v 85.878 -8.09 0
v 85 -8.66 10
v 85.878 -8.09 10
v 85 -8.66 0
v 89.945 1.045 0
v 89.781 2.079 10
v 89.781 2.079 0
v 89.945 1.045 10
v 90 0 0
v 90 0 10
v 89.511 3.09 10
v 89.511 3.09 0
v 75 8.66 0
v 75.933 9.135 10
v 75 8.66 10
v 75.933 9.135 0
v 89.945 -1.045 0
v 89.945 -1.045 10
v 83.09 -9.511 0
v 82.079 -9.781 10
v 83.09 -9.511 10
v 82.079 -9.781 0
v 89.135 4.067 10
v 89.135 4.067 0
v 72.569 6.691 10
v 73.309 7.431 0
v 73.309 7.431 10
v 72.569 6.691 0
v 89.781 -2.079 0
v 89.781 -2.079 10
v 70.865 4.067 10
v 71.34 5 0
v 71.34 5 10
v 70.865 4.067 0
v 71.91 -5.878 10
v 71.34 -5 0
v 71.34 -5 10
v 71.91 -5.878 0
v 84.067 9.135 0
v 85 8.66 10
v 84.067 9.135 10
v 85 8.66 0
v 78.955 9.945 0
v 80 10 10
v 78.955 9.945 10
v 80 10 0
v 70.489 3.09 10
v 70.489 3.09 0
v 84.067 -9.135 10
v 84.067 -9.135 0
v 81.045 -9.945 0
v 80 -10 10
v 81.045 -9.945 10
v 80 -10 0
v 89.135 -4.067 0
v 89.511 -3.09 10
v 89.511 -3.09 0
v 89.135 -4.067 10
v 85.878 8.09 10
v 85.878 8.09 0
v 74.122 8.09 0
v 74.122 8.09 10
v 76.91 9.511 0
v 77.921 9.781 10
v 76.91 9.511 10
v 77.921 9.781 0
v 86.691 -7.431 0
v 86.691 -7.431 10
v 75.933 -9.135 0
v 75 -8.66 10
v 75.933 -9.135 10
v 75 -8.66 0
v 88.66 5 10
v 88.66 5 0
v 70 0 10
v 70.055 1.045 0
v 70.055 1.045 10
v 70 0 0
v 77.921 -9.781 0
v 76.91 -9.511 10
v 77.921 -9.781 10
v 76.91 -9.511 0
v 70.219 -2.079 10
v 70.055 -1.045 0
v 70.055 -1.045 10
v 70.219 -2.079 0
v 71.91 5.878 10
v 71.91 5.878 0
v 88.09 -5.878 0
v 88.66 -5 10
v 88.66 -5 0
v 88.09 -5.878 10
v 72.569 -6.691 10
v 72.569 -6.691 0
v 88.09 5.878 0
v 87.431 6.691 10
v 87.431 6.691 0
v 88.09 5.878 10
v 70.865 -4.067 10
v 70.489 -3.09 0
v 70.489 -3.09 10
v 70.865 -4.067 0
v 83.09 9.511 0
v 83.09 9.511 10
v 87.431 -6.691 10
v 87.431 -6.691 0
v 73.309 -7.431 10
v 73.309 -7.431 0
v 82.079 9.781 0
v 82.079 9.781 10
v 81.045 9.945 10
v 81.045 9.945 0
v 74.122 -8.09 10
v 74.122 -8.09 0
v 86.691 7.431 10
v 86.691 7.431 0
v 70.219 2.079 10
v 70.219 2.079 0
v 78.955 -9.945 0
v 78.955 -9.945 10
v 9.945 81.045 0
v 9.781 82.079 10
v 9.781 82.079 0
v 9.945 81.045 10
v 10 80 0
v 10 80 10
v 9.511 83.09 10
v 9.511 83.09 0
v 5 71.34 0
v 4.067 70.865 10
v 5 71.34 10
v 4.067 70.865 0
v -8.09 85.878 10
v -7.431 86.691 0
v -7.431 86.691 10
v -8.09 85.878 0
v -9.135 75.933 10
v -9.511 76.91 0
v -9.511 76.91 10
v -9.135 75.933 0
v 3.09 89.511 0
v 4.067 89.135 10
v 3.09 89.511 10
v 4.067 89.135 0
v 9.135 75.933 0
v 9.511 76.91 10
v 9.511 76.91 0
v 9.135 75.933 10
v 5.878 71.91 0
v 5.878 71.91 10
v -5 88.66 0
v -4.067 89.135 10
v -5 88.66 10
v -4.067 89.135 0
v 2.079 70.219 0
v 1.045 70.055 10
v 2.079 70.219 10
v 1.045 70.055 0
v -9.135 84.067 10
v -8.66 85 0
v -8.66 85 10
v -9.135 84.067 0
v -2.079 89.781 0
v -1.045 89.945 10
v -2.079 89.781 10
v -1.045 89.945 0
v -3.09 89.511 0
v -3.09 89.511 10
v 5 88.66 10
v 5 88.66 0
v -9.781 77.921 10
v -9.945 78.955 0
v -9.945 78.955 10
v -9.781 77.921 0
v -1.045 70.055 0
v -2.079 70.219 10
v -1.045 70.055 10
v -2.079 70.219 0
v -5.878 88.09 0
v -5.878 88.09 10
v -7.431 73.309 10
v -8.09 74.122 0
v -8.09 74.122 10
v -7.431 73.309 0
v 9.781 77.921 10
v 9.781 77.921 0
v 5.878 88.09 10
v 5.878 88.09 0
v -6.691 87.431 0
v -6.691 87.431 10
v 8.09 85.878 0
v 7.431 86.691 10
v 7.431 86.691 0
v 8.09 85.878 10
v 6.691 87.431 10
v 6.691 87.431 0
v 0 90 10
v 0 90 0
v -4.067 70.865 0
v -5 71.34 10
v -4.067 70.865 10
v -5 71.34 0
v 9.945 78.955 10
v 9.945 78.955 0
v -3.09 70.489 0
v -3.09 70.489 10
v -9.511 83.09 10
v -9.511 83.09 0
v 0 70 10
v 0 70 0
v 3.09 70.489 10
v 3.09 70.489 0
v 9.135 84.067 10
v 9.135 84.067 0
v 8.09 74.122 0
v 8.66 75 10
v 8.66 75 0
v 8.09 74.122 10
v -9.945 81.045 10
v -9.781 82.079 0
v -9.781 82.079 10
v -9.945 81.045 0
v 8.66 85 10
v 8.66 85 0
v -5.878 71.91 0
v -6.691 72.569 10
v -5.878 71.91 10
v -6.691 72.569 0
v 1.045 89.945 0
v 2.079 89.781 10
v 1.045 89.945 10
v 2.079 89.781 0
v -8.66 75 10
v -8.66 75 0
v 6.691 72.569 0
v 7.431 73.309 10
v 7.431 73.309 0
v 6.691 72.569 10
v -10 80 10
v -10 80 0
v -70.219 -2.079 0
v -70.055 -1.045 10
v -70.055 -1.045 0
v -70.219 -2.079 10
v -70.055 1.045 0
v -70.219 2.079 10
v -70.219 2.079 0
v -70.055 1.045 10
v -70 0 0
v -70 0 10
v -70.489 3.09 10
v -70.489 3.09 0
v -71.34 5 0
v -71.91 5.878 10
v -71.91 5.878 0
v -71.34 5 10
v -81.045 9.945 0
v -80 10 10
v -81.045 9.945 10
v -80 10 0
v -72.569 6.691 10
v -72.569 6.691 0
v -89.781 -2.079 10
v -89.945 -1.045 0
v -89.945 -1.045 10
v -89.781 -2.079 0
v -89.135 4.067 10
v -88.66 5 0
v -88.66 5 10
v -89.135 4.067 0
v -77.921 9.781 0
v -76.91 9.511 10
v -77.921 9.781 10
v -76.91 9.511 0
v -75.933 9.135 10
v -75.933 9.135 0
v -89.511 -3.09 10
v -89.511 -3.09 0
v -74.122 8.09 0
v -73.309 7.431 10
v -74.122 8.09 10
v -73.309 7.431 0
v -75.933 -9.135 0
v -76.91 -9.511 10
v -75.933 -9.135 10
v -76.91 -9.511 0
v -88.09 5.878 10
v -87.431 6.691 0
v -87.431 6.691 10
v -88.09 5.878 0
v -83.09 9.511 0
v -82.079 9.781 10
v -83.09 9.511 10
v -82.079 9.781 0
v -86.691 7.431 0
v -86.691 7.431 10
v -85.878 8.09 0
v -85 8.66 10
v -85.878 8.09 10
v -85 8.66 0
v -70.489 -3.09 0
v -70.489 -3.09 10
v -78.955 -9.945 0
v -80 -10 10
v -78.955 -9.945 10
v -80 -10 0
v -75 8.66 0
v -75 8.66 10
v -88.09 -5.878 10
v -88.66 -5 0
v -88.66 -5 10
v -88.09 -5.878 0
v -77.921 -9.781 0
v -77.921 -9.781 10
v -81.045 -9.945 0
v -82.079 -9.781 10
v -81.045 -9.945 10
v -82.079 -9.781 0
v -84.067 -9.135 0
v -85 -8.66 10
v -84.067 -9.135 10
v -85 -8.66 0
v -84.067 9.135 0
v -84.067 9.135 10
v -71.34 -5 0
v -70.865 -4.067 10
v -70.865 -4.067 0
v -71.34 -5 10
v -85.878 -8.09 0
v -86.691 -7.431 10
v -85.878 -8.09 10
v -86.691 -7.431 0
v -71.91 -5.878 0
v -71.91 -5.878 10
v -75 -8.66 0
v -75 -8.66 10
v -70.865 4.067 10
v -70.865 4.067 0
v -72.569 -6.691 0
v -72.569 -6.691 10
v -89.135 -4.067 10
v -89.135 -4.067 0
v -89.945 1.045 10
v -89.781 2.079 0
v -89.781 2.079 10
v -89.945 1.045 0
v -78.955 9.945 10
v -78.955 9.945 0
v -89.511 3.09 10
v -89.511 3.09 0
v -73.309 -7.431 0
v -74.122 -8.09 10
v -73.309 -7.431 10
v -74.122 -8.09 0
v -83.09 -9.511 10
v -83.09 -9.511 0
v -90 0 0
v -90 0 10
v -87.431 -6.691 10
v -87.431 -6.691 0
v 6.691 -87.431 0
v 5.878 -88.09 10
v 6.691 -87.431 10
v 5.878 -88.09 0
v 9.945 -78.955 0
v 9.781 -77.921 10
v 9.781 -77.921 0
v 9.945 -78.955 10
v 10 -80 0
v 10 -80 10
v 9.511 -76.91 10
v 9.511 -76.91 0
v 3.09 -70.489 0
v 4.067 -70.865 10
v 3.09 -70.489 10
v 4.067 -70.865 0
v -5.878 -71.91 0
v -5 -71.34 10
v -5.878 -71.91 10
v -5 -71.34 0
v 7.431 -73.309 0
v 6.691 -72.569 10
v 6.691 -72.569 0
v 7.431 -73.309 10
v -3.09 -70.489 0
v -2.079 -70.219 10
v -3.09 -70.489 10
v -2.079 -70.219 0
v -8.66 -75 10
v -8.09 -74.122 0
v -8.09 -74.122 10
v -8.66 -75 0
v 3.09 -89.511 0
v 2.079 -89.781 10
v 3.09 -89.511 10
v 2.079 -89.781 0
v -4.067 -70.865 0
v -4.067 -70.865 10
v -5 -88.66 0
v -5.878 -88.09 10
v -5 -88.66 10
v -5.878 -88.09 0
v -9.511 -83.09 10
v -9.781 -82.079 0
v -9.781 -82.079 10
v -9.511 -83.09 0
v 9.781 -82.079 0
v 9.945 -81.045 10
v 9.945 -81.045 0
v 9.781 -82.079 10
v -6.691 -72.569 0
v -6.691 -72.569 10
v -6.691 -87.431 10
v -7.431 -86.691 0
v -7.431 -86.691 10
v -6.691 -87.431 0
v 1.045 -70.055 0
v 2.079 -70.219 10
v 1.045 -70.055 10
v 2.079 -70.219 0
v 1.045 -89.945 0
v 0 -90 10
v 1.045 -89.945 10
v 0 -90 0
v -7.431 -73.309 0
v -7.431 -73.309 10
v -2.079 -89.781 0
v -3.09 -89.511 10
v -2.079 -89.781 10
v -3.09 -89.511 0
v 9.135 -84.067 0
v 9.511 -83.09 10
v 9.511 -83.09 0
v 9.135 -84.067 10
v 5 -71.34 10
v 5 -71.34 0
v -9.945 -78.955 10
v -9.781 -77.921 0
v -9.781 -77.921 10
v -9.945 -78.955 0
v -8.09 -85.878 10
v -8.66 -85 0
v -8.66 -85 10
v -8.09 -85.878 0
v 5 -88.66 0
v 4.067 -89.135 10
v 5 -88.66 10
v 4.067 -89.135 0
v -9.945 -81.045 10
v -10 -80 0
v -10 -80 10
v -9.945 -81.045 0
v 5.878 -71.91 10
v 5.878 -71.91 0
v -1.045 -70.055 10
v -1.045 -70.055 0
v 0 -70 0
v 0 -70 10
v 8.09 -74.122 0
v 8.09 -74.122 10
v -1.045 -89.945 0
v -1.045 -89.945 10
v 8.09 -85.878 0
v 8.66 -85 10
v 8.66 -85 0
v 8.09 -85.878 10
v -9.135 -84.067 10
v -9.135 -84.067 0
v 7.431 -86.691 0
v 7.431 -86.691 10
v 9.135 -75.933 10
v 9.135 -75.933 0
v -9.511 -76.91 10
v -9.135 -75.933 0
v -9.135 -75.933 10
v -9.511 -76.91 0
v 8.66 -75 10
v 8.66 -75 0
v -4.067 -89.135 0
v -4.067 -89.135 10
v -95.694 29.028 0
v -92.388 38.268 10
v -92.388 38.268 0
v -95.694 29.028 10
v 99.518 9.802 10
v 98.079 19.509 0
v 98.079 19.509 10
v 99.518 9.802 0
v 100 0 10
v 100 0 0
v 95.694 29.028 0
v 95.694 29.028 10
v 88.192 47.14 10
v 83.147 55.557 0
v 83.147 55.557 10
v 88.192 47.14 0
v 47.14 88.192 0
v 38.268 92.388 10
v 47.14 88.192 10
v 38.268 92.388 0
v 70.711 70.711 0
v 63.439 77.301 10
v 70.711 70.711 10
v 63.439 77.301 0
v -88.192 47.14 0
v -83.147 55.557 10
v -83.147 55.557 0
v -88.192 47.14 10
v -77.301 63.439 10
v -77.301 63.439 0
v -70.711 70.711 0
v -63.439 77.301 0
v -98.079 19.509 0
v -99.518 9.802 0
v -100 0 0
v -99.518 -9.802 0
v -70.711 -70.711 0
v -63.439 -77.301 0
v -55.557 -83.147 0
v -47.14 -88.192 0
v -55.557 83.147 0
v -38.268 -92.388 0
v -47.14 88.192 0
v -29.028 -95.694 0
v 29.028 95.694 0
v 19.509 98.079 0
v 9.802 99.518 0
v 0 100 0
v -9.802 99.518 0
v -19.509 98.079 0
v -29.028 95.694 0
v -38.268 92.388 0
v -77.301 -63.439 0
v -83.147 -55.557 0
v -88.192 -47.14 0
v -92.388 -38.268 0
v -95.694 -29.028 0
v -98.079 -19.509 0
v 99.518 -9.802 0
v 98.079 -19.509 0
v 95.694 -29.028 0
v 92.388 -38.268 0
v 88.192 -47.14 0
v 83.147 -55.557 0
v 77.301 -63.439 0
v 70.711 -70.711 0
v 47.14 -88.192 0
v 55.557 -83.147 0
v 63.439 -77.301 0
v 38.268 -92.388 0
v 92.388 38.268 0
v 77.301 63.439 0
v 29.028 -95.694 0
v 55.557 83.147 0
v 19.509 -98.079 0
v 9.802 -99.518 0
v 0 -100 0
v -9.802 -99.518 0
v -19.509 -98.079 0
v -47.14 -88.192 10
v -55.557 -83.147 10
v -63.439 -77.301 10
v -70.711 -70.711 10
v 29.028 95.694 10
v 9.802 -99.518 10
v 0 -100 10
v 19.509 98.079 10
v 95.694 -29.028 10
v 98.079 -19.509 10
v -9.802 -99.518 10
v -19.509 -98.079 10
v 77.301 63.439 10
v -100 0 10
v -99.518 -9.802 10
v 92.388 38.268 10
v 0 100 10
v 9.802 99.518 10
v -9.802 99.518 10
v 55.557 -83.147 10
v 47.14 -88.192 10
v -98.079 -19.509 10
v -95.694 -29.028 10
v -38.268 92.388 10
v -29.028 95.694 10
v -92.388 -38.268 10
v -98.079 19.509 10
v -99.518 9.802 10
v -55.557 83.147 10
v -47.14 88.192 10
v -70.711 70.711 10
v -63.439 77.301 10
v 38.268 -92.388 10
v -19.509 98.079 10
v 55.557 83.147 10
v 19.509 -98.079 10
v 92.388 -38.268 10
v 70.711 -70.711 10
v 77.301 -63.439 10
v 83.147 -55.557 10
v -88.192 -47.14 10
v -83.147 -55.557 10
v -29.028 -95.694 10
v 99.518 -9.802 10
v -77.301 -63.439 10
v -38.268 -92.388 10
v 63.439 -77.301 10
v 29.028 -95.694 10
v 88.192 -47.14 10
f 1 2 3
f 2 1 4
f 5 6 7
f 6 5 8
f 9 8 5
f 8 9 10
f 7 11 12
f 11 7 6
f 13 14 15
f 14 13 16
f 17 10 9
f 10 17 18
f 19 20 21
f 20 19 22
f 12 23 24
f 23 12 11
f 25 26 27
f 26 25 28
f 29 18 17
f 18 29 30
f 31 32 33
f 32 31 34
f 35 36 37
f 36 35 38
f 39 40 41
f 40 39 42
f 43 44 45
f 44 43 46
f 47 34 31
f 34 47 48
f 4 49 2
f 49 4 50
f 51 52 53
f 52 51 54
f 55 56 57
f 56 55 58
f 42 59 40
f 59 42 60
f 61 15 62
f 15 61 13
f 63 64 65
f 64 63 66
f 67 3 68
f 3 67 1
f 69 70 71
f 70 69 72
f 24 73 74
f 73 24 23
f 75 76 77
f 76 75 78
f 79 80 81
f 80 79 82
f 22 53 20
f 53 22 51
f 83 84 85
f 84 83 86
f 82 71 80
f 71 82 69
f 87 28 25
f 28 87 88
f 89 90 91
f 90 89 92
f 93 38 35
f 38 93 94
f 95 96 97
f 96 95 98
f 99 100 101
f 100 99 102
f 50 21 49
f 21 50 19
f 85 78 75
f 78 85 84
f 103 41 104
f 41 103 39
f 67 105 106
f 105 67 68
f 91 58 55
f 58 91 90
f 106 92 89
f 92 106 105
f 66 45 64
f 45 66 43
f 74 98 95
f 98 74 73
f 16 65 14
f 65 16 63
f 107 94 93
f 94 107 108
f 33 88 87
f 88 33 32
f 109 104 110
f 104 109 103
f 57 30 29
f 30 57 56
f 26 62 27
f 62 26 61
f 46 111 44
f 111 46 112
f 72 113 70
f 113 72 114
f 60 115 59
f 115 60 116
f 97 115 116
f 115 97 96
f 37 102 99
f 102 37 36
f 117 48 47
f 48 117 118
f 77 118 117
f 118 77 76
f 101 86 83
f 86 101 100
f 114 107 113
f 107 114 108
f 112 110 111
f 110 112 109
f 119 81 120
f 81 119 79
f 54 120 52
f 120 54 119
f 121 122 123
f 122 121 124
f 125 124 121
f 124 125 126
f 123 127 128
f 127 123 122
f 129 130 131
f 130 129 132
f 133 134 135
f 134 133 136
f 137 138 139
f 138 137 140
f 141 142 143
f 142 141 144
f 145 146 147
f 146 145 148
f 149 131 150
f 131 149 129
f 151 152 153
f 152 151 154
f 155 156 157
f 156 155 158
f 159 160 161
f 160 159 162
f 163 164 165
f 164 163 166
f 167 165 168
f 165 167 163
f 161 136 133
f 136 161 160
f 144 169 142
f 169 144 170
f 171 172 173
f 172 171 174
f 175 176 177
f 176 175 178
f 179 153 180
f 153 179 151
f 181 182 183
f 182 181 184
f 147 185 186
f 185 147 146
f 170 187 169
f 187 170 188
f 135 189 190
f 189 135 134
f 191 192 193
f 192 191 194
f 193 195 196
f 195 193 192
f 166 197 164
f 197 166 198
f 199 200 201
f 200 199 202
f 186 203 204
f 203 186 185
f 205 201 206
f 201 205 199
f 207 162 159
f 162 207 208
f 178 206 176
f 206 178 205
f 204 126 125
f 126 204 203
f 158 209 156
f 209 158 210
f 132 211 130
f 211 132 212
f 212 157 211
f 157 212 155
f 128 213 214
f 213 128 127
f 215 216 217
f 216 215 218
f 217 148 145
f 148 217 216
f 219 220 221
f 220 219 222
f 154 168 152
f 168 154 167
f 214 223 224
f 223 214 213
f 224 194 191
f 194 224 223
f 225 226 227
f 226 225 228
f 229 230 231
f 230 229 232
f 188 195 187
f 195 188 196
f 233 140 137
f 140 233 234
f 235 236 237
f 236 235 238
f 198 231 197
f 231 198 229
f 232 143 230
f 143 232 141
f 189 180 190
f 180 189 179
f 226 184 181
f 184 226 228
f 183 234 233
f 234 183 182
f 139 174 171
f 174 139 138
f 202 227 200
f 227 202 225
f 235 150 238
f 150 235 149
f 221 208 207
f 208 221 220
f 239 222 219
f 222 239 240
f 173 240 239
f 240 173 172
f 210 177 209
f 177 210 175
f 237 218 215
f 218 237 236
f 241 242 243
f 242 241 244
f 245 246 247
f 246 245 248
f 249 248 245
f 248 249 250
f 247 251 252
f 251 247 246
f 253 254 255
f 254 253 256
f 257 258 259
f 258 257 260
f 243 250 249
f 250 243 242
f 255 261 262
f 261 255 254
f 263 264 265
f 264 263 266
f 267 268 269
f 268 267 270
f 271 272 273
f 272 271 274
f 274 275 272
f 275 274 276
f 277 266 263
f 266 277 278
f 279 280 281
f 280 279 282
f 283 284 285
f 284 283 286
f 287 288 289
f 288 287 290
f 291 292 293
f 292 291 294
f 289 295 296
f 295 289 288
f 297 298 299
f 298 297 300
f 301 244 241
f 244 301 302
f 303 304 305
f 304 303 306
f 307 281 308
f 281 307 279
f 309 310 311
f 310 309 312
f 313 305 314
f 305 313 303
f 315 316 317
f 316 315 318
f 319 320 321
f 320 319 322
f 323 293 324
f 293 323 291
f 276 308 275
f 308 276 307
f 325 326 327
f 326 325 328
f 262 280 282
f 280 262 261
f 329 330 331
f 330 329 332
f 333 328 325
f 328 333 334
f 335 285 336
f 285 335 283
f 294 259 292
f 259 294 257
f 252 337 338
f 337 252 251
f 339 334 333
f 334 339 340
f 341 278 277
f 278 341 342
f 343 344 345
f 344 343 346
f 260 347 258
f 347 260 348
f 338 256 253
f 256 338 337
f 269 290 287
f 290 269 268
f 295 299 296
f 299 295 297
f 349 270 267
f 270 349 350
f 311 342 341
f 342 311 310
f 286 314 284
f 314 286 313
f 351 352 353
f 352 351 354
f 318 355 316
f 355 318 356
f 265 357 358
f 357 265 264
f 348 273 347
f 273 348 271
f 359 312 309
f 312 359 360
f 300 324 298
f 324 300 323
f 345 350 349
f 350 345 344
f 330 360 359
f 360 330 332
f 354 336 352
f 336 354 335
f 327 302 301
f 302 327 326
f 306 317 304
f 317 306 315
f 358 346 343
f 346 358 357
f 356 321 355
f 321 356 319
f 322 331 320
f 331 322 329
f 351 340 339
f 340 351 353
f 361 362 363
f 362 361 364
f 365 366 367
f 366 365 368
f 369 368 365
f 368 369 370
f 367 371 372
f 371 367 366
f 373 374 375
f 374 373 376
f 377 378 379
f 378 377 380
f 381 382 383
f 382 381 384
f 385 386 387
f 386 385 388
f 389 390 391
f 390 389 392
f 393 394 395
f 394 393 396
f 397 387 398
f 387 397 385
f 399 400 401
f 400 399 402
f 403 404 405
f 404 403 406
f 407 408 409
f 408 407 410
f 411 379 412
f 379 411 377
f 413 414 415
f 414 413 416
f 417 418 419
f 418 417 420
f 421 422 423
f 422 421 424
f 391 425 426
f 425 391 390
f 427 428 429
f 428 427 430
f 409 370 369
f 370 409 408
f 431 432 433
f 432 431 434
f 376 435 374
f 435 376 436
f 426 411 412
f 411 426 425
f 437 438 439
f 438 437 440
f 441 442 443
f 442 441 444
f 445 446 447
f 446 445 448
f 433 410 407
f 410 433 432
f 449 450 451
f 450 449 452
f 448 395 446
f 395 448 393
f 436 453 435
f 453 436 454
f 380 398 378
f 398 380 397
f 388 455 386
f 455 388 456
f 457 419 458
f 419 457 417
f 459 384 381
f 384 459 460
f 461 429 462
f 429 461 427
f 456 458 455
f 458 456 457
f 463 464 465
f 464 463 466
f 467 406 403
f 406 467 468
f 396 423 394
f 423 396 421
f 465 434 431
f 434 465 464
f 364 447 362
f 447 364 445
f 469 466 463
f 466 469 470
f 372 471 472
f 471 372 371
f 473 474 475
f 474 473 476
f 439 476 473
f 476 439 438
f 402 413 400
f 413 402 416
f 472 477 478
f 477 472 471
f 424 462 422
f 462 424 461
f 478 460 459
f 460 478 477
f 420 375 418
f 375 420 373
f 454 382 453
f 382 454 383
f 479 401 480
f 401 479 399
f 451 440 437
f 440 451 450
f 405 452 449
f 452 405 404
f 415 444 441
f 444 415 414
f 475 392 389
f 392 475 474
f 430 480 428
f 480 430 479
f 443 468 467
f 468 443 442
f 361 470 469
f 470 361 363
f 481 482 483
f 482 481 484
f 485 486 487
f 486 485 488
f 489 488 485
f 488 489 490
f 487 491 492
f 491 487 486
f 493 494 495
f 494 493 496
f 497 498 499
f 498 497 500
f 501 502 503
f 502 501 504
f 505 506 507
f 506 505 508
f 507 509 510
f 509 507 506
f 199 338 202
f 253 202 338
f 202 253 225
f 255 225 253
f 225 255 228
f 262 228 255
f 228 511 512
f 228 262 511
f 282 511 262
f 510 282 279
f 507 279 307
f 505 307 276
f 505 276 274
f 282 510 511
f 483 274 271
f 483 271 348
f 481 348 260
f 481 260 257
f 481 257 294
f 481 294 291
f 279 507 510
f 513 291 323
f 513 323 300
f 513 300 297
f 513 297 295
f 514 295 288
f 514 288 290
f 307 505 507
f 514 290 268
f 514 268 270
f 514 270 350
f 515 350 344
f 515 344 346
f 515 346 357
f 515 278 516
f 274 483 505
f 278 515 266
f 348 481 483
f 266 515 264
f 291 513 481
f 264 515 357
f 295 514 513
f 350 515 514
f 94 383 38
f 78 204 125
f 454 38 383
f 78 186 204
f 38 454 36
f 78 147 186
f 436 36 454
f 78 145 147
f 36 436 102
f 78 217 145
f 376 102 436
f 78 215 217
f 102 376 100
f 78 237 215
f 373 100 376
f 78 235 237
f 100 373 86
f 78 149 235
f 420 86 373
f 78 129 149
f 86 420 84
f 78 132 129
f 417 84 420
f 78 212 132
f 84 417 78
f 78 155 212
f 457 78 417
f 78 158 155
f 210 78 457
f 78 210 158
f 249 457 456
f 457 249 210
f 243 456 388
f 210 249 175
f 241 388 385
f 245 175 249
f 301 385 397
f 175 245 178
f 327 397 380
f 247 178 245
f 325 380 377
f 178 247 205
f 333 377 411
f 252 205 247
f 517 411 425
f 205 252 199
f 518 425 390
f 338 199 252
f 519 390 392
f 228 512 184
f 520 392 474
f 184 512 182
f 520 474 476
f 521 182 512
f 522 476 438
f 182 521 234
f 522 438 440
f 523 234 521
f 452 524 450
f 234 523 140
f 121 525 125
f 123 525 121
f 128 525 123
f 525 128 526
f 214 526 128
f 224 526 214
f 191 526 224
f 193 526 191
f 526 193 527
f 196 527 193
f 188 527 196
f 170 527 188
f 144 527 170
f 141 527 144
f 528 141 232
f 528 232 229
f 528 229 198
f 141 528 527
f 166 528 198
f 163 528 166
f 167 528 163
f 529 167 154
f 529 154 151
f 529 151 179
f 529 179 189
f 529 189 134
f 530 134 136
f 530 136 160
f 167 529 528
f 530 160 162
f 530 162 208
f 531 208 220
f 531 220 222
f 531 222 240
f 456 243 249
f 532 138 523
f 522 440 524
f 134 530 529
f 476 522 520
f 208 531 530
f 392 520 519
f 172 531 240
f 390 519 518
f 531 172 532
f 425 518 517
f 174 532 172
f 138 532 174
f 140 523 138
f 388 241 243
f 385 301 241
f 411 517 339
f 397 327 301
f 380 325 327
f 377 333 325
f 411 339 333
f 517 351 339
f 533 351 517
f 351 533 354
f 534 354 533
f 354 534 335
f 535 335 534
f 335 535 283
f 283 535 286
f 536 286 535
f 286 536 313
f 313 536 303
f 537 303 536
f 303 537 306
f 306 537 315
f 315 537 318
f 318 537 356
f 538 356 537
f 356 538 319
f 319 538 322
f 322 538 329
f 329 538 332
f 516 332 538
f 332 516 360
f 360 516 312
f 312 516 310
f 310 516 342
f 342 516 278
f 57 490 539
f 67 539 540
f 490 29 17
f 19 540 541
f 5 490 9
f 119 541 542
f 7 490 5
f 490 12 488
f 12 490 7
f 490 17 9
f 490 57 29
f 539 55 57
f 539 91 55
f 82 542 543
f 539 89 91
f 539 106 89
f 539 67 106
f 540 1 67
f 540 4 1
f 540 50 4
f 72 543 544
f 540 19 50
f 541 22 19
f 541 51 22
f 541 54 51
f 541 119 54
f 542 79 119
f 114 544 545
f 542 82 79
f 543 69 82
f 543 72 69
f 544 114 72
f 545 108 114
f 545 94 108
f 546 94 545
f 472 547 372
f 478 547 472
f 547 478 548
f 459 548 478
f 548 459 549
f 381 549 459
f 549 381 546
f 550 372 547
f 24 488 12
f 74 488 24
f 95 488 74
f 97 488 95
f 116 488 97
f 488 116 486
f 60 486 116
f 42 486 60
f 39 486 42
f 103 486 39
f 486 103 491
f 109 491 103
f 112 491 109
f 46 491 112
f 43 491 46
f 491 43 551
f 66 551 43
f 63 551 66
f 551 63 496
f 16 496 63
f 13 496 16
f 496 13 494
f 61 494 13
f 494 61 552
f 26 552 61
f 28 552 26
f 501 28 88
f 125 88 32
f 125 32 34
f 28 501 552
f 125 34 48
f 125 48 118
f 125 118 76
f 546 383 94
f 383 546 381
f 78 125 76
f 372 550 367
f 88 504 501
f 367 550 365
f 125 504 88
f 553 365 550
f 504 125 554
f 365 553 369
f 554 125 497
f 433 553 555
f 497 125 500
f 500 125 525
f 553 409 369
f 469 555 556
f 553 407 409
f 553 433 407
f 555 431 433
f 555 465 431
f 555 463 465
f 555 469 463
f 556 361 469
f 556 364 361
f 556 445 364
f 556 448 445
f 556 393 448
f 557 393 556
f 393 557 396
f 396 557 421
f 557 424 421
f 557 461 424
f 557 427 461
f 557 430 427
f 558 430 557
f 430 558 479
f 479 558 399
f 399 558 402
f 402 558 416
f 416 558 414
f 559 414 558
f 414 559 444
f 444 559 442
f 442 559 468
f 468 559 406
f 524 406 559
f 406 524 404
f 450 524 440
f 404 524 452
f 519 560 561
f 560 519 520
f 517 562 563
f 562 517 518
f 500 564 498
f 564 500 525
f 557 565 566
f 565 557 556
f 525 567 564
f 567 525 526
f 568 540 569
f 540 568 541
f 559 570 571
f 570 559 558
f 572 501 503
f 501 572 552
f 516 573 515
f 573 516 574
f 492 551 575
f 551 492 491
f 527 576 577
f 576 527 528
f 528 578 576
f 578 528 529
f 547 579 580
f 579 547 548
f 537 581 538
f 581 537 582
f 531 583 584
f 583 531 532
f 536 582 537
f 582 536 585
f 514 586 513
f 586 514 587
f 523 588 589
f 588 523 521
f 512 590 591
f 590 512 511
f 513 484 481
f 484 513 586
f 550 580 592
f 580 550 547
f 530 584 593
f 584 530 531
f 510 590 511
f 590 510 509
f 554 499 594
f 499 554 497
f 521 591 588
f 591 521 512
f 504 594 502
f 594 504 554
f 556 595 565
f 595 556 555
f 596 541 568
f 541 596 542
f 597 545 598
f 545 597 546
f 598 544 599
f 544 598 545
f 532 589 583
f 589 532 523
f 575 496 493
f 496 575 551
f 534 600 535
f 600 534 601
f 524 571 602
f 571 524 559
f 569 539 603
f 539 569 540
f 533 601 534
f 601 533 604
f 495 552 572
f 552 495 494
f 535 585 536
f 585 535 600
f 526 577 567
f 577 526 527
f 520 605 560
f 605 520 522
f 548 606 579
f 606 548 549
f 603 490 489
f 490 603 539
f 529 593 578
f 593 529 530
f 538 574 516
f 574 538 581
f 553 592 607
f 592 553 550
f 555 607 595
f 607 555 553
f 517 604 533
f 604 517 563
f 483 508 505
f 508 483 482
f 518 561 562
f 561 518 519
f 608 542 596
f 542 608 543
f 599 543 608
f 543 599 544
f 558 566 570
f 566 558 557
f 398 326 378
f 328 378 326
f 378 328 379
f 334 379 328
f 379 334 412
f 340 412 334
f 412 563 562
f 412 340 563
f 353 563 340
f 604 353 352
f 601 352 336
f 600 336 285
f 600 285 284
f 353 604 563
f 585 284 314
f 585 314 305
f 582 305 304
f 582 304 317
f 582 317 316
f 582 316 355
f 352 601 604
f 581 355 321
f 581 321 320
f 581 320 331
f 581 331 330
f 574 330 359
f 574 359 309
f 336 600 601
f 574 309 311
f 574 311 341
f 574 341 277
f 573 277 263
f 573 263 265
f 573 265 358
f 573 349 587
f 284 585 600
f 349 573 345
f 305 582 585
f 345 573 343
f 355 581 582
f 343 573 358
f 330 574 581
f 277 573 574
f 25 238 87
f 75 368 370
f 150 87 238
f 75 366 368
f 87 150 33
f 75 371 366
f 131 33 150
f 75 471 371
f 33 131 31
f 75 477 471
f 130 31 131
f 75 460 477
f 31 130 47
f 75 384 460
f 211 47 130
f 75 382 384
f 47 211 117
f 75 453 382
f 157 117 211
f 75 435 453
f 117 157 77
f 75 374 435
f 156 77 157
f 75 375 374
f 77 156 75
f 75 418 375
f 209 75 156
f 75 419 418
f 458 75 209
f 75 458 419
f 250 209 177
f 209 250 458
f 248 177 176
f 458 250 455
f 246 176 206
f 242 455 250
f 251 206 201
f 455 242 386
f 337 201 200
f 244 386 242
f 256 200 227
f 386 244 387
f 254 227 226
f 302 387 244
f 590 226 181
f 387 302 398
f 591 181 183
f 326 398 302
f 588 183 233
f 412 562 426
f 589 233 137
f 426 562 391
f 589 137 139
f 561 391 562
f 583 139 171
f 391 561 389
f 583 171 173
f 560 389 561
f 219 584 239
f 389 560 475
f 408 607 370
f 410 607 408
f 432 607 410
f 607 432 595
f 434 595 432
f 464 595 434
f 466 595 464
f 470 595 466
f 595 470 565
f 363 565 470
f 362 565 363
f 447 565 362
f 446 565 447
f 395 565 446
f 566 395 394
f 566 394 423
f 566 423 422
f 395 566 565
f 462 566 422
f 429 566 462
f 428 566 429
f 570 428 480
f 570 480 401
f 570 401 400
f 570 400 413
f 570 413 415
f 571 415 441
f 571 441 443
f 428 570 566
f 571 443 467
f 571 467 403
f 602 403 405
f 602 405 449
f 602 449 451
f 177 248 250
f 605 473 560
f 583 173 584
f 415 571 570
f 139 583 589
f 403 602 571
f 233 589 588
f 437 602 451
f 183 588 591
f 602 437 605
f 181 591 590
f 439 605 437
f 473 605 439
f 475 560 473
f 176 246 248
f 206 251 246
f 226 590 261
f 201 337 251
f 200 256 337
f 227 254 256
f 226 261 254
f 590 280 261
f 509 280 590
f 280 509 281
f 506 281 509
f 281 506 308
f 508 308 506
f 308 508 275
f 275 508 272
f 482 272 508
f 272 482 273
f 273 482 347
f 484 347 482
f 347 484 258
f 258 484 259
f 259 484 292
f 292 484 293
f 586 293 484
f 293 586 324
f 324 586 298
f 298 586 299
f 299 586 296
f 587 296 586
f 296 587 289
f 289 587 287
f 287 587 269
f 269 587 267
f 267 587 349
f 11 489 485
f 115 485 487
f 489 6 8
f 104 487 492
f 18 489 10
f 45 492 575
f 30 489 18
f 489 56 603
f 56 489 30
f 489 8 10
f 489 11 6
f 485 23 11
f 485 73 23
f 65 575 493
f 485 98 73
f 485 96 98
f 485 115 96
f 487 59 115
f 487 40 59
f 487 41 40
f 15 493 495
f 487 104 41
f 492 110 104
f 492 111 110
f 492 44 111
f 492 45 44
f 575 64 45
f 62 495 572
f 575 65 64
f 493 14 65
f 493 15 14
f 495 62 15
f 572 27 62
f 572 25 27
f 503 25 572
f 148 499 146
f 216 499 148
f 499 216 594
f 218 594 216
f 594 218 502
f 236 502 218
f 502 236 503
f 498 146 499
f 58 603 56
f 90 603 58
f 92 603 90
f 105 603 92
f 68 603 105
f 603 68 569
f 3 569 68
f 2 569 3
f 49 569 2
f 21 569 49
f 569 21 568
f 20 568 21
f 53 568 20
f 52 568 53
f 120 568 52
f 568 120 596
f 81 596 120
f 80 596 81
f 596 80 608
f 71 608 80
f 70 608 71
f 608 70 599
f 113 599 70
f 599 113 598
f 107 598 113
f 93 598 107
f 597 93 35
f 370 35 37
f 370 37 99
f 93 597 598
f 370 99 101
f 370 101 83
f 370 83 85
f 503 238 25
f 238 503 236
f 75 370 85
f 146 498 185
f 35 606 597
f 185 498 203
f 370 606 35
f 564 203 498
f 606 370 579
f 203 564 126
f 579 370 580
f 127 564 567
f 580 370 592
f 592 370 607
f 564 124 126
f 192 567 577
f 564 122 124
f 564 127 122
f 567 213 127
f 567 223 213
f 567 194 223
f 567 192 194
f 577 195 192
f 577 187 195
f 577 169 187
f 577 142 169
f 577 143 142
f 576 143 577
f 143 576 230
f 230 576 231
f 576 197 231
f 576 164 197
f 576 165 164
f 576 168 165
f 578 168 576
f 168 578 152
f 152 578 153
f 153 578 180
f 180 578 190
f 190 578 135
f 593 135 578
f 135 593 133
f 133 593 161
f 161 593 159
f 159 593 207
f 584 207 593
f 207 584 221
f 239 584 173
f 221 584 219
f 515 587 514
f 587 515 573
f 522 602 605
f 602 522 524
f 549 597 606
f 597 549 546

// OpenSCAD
module Flange_02(){
    color("#c0c6c7")
    
    difference(){
        cylinder(10,100,100, $fn = $preview ? 32 : 64);
        r = 80;
        for (i=[0:90:359]) {
            translate([r*cos(i),r*sin(i),-1])
            cylinder(12,10,10,$fn=60);
            }
    }
}

Flange_02();


// Written by Nicolì Angelo (Gengio) 2024: 
// MIT License

//Permission is hereby granted, free of charge, to any person obtaining a copy of this software and associated documentation files (the "Software"), to deal in the Software without restriction, including without limitation the rights to use, copy, modify, merge, publish, distribute, sublicense, and/or sell copies of the Software, and to permit persons to whom the Software is furnished to do so, subject to the following conditions:

//The above copyright notice and this permission notice shall be included in all copies or substantial portions of the Software.

//THE SOFTWARE IS PROVIDED "AS IS", WITHOUT WARRANTY OF ANY KIND, EXPRESS OR IMPLIED, INCLUDING BUT NOT LIMITED TO THE WARRANTIES OF MERCHANTABILITY, FITNESS FOR A PARTICULAR PURPOSE AND NONINFRINGEMENT. IN NO EVENT SHALL THE AUTHORS OR COPYRIGHT HOLDERS BE LIABLE FOR ANY CLAIM, DAMAGES OR OTHER LIABILITY, WHETHER IN AN ACTION OF CONTRACT, TORT OR OTHERWISE, ARISING FROM, OUT OF OR IN CONNECTION WITH THE SOFTWARE OR THE USE OR OTHER DEALINGS IN THE SOFTWARE.
